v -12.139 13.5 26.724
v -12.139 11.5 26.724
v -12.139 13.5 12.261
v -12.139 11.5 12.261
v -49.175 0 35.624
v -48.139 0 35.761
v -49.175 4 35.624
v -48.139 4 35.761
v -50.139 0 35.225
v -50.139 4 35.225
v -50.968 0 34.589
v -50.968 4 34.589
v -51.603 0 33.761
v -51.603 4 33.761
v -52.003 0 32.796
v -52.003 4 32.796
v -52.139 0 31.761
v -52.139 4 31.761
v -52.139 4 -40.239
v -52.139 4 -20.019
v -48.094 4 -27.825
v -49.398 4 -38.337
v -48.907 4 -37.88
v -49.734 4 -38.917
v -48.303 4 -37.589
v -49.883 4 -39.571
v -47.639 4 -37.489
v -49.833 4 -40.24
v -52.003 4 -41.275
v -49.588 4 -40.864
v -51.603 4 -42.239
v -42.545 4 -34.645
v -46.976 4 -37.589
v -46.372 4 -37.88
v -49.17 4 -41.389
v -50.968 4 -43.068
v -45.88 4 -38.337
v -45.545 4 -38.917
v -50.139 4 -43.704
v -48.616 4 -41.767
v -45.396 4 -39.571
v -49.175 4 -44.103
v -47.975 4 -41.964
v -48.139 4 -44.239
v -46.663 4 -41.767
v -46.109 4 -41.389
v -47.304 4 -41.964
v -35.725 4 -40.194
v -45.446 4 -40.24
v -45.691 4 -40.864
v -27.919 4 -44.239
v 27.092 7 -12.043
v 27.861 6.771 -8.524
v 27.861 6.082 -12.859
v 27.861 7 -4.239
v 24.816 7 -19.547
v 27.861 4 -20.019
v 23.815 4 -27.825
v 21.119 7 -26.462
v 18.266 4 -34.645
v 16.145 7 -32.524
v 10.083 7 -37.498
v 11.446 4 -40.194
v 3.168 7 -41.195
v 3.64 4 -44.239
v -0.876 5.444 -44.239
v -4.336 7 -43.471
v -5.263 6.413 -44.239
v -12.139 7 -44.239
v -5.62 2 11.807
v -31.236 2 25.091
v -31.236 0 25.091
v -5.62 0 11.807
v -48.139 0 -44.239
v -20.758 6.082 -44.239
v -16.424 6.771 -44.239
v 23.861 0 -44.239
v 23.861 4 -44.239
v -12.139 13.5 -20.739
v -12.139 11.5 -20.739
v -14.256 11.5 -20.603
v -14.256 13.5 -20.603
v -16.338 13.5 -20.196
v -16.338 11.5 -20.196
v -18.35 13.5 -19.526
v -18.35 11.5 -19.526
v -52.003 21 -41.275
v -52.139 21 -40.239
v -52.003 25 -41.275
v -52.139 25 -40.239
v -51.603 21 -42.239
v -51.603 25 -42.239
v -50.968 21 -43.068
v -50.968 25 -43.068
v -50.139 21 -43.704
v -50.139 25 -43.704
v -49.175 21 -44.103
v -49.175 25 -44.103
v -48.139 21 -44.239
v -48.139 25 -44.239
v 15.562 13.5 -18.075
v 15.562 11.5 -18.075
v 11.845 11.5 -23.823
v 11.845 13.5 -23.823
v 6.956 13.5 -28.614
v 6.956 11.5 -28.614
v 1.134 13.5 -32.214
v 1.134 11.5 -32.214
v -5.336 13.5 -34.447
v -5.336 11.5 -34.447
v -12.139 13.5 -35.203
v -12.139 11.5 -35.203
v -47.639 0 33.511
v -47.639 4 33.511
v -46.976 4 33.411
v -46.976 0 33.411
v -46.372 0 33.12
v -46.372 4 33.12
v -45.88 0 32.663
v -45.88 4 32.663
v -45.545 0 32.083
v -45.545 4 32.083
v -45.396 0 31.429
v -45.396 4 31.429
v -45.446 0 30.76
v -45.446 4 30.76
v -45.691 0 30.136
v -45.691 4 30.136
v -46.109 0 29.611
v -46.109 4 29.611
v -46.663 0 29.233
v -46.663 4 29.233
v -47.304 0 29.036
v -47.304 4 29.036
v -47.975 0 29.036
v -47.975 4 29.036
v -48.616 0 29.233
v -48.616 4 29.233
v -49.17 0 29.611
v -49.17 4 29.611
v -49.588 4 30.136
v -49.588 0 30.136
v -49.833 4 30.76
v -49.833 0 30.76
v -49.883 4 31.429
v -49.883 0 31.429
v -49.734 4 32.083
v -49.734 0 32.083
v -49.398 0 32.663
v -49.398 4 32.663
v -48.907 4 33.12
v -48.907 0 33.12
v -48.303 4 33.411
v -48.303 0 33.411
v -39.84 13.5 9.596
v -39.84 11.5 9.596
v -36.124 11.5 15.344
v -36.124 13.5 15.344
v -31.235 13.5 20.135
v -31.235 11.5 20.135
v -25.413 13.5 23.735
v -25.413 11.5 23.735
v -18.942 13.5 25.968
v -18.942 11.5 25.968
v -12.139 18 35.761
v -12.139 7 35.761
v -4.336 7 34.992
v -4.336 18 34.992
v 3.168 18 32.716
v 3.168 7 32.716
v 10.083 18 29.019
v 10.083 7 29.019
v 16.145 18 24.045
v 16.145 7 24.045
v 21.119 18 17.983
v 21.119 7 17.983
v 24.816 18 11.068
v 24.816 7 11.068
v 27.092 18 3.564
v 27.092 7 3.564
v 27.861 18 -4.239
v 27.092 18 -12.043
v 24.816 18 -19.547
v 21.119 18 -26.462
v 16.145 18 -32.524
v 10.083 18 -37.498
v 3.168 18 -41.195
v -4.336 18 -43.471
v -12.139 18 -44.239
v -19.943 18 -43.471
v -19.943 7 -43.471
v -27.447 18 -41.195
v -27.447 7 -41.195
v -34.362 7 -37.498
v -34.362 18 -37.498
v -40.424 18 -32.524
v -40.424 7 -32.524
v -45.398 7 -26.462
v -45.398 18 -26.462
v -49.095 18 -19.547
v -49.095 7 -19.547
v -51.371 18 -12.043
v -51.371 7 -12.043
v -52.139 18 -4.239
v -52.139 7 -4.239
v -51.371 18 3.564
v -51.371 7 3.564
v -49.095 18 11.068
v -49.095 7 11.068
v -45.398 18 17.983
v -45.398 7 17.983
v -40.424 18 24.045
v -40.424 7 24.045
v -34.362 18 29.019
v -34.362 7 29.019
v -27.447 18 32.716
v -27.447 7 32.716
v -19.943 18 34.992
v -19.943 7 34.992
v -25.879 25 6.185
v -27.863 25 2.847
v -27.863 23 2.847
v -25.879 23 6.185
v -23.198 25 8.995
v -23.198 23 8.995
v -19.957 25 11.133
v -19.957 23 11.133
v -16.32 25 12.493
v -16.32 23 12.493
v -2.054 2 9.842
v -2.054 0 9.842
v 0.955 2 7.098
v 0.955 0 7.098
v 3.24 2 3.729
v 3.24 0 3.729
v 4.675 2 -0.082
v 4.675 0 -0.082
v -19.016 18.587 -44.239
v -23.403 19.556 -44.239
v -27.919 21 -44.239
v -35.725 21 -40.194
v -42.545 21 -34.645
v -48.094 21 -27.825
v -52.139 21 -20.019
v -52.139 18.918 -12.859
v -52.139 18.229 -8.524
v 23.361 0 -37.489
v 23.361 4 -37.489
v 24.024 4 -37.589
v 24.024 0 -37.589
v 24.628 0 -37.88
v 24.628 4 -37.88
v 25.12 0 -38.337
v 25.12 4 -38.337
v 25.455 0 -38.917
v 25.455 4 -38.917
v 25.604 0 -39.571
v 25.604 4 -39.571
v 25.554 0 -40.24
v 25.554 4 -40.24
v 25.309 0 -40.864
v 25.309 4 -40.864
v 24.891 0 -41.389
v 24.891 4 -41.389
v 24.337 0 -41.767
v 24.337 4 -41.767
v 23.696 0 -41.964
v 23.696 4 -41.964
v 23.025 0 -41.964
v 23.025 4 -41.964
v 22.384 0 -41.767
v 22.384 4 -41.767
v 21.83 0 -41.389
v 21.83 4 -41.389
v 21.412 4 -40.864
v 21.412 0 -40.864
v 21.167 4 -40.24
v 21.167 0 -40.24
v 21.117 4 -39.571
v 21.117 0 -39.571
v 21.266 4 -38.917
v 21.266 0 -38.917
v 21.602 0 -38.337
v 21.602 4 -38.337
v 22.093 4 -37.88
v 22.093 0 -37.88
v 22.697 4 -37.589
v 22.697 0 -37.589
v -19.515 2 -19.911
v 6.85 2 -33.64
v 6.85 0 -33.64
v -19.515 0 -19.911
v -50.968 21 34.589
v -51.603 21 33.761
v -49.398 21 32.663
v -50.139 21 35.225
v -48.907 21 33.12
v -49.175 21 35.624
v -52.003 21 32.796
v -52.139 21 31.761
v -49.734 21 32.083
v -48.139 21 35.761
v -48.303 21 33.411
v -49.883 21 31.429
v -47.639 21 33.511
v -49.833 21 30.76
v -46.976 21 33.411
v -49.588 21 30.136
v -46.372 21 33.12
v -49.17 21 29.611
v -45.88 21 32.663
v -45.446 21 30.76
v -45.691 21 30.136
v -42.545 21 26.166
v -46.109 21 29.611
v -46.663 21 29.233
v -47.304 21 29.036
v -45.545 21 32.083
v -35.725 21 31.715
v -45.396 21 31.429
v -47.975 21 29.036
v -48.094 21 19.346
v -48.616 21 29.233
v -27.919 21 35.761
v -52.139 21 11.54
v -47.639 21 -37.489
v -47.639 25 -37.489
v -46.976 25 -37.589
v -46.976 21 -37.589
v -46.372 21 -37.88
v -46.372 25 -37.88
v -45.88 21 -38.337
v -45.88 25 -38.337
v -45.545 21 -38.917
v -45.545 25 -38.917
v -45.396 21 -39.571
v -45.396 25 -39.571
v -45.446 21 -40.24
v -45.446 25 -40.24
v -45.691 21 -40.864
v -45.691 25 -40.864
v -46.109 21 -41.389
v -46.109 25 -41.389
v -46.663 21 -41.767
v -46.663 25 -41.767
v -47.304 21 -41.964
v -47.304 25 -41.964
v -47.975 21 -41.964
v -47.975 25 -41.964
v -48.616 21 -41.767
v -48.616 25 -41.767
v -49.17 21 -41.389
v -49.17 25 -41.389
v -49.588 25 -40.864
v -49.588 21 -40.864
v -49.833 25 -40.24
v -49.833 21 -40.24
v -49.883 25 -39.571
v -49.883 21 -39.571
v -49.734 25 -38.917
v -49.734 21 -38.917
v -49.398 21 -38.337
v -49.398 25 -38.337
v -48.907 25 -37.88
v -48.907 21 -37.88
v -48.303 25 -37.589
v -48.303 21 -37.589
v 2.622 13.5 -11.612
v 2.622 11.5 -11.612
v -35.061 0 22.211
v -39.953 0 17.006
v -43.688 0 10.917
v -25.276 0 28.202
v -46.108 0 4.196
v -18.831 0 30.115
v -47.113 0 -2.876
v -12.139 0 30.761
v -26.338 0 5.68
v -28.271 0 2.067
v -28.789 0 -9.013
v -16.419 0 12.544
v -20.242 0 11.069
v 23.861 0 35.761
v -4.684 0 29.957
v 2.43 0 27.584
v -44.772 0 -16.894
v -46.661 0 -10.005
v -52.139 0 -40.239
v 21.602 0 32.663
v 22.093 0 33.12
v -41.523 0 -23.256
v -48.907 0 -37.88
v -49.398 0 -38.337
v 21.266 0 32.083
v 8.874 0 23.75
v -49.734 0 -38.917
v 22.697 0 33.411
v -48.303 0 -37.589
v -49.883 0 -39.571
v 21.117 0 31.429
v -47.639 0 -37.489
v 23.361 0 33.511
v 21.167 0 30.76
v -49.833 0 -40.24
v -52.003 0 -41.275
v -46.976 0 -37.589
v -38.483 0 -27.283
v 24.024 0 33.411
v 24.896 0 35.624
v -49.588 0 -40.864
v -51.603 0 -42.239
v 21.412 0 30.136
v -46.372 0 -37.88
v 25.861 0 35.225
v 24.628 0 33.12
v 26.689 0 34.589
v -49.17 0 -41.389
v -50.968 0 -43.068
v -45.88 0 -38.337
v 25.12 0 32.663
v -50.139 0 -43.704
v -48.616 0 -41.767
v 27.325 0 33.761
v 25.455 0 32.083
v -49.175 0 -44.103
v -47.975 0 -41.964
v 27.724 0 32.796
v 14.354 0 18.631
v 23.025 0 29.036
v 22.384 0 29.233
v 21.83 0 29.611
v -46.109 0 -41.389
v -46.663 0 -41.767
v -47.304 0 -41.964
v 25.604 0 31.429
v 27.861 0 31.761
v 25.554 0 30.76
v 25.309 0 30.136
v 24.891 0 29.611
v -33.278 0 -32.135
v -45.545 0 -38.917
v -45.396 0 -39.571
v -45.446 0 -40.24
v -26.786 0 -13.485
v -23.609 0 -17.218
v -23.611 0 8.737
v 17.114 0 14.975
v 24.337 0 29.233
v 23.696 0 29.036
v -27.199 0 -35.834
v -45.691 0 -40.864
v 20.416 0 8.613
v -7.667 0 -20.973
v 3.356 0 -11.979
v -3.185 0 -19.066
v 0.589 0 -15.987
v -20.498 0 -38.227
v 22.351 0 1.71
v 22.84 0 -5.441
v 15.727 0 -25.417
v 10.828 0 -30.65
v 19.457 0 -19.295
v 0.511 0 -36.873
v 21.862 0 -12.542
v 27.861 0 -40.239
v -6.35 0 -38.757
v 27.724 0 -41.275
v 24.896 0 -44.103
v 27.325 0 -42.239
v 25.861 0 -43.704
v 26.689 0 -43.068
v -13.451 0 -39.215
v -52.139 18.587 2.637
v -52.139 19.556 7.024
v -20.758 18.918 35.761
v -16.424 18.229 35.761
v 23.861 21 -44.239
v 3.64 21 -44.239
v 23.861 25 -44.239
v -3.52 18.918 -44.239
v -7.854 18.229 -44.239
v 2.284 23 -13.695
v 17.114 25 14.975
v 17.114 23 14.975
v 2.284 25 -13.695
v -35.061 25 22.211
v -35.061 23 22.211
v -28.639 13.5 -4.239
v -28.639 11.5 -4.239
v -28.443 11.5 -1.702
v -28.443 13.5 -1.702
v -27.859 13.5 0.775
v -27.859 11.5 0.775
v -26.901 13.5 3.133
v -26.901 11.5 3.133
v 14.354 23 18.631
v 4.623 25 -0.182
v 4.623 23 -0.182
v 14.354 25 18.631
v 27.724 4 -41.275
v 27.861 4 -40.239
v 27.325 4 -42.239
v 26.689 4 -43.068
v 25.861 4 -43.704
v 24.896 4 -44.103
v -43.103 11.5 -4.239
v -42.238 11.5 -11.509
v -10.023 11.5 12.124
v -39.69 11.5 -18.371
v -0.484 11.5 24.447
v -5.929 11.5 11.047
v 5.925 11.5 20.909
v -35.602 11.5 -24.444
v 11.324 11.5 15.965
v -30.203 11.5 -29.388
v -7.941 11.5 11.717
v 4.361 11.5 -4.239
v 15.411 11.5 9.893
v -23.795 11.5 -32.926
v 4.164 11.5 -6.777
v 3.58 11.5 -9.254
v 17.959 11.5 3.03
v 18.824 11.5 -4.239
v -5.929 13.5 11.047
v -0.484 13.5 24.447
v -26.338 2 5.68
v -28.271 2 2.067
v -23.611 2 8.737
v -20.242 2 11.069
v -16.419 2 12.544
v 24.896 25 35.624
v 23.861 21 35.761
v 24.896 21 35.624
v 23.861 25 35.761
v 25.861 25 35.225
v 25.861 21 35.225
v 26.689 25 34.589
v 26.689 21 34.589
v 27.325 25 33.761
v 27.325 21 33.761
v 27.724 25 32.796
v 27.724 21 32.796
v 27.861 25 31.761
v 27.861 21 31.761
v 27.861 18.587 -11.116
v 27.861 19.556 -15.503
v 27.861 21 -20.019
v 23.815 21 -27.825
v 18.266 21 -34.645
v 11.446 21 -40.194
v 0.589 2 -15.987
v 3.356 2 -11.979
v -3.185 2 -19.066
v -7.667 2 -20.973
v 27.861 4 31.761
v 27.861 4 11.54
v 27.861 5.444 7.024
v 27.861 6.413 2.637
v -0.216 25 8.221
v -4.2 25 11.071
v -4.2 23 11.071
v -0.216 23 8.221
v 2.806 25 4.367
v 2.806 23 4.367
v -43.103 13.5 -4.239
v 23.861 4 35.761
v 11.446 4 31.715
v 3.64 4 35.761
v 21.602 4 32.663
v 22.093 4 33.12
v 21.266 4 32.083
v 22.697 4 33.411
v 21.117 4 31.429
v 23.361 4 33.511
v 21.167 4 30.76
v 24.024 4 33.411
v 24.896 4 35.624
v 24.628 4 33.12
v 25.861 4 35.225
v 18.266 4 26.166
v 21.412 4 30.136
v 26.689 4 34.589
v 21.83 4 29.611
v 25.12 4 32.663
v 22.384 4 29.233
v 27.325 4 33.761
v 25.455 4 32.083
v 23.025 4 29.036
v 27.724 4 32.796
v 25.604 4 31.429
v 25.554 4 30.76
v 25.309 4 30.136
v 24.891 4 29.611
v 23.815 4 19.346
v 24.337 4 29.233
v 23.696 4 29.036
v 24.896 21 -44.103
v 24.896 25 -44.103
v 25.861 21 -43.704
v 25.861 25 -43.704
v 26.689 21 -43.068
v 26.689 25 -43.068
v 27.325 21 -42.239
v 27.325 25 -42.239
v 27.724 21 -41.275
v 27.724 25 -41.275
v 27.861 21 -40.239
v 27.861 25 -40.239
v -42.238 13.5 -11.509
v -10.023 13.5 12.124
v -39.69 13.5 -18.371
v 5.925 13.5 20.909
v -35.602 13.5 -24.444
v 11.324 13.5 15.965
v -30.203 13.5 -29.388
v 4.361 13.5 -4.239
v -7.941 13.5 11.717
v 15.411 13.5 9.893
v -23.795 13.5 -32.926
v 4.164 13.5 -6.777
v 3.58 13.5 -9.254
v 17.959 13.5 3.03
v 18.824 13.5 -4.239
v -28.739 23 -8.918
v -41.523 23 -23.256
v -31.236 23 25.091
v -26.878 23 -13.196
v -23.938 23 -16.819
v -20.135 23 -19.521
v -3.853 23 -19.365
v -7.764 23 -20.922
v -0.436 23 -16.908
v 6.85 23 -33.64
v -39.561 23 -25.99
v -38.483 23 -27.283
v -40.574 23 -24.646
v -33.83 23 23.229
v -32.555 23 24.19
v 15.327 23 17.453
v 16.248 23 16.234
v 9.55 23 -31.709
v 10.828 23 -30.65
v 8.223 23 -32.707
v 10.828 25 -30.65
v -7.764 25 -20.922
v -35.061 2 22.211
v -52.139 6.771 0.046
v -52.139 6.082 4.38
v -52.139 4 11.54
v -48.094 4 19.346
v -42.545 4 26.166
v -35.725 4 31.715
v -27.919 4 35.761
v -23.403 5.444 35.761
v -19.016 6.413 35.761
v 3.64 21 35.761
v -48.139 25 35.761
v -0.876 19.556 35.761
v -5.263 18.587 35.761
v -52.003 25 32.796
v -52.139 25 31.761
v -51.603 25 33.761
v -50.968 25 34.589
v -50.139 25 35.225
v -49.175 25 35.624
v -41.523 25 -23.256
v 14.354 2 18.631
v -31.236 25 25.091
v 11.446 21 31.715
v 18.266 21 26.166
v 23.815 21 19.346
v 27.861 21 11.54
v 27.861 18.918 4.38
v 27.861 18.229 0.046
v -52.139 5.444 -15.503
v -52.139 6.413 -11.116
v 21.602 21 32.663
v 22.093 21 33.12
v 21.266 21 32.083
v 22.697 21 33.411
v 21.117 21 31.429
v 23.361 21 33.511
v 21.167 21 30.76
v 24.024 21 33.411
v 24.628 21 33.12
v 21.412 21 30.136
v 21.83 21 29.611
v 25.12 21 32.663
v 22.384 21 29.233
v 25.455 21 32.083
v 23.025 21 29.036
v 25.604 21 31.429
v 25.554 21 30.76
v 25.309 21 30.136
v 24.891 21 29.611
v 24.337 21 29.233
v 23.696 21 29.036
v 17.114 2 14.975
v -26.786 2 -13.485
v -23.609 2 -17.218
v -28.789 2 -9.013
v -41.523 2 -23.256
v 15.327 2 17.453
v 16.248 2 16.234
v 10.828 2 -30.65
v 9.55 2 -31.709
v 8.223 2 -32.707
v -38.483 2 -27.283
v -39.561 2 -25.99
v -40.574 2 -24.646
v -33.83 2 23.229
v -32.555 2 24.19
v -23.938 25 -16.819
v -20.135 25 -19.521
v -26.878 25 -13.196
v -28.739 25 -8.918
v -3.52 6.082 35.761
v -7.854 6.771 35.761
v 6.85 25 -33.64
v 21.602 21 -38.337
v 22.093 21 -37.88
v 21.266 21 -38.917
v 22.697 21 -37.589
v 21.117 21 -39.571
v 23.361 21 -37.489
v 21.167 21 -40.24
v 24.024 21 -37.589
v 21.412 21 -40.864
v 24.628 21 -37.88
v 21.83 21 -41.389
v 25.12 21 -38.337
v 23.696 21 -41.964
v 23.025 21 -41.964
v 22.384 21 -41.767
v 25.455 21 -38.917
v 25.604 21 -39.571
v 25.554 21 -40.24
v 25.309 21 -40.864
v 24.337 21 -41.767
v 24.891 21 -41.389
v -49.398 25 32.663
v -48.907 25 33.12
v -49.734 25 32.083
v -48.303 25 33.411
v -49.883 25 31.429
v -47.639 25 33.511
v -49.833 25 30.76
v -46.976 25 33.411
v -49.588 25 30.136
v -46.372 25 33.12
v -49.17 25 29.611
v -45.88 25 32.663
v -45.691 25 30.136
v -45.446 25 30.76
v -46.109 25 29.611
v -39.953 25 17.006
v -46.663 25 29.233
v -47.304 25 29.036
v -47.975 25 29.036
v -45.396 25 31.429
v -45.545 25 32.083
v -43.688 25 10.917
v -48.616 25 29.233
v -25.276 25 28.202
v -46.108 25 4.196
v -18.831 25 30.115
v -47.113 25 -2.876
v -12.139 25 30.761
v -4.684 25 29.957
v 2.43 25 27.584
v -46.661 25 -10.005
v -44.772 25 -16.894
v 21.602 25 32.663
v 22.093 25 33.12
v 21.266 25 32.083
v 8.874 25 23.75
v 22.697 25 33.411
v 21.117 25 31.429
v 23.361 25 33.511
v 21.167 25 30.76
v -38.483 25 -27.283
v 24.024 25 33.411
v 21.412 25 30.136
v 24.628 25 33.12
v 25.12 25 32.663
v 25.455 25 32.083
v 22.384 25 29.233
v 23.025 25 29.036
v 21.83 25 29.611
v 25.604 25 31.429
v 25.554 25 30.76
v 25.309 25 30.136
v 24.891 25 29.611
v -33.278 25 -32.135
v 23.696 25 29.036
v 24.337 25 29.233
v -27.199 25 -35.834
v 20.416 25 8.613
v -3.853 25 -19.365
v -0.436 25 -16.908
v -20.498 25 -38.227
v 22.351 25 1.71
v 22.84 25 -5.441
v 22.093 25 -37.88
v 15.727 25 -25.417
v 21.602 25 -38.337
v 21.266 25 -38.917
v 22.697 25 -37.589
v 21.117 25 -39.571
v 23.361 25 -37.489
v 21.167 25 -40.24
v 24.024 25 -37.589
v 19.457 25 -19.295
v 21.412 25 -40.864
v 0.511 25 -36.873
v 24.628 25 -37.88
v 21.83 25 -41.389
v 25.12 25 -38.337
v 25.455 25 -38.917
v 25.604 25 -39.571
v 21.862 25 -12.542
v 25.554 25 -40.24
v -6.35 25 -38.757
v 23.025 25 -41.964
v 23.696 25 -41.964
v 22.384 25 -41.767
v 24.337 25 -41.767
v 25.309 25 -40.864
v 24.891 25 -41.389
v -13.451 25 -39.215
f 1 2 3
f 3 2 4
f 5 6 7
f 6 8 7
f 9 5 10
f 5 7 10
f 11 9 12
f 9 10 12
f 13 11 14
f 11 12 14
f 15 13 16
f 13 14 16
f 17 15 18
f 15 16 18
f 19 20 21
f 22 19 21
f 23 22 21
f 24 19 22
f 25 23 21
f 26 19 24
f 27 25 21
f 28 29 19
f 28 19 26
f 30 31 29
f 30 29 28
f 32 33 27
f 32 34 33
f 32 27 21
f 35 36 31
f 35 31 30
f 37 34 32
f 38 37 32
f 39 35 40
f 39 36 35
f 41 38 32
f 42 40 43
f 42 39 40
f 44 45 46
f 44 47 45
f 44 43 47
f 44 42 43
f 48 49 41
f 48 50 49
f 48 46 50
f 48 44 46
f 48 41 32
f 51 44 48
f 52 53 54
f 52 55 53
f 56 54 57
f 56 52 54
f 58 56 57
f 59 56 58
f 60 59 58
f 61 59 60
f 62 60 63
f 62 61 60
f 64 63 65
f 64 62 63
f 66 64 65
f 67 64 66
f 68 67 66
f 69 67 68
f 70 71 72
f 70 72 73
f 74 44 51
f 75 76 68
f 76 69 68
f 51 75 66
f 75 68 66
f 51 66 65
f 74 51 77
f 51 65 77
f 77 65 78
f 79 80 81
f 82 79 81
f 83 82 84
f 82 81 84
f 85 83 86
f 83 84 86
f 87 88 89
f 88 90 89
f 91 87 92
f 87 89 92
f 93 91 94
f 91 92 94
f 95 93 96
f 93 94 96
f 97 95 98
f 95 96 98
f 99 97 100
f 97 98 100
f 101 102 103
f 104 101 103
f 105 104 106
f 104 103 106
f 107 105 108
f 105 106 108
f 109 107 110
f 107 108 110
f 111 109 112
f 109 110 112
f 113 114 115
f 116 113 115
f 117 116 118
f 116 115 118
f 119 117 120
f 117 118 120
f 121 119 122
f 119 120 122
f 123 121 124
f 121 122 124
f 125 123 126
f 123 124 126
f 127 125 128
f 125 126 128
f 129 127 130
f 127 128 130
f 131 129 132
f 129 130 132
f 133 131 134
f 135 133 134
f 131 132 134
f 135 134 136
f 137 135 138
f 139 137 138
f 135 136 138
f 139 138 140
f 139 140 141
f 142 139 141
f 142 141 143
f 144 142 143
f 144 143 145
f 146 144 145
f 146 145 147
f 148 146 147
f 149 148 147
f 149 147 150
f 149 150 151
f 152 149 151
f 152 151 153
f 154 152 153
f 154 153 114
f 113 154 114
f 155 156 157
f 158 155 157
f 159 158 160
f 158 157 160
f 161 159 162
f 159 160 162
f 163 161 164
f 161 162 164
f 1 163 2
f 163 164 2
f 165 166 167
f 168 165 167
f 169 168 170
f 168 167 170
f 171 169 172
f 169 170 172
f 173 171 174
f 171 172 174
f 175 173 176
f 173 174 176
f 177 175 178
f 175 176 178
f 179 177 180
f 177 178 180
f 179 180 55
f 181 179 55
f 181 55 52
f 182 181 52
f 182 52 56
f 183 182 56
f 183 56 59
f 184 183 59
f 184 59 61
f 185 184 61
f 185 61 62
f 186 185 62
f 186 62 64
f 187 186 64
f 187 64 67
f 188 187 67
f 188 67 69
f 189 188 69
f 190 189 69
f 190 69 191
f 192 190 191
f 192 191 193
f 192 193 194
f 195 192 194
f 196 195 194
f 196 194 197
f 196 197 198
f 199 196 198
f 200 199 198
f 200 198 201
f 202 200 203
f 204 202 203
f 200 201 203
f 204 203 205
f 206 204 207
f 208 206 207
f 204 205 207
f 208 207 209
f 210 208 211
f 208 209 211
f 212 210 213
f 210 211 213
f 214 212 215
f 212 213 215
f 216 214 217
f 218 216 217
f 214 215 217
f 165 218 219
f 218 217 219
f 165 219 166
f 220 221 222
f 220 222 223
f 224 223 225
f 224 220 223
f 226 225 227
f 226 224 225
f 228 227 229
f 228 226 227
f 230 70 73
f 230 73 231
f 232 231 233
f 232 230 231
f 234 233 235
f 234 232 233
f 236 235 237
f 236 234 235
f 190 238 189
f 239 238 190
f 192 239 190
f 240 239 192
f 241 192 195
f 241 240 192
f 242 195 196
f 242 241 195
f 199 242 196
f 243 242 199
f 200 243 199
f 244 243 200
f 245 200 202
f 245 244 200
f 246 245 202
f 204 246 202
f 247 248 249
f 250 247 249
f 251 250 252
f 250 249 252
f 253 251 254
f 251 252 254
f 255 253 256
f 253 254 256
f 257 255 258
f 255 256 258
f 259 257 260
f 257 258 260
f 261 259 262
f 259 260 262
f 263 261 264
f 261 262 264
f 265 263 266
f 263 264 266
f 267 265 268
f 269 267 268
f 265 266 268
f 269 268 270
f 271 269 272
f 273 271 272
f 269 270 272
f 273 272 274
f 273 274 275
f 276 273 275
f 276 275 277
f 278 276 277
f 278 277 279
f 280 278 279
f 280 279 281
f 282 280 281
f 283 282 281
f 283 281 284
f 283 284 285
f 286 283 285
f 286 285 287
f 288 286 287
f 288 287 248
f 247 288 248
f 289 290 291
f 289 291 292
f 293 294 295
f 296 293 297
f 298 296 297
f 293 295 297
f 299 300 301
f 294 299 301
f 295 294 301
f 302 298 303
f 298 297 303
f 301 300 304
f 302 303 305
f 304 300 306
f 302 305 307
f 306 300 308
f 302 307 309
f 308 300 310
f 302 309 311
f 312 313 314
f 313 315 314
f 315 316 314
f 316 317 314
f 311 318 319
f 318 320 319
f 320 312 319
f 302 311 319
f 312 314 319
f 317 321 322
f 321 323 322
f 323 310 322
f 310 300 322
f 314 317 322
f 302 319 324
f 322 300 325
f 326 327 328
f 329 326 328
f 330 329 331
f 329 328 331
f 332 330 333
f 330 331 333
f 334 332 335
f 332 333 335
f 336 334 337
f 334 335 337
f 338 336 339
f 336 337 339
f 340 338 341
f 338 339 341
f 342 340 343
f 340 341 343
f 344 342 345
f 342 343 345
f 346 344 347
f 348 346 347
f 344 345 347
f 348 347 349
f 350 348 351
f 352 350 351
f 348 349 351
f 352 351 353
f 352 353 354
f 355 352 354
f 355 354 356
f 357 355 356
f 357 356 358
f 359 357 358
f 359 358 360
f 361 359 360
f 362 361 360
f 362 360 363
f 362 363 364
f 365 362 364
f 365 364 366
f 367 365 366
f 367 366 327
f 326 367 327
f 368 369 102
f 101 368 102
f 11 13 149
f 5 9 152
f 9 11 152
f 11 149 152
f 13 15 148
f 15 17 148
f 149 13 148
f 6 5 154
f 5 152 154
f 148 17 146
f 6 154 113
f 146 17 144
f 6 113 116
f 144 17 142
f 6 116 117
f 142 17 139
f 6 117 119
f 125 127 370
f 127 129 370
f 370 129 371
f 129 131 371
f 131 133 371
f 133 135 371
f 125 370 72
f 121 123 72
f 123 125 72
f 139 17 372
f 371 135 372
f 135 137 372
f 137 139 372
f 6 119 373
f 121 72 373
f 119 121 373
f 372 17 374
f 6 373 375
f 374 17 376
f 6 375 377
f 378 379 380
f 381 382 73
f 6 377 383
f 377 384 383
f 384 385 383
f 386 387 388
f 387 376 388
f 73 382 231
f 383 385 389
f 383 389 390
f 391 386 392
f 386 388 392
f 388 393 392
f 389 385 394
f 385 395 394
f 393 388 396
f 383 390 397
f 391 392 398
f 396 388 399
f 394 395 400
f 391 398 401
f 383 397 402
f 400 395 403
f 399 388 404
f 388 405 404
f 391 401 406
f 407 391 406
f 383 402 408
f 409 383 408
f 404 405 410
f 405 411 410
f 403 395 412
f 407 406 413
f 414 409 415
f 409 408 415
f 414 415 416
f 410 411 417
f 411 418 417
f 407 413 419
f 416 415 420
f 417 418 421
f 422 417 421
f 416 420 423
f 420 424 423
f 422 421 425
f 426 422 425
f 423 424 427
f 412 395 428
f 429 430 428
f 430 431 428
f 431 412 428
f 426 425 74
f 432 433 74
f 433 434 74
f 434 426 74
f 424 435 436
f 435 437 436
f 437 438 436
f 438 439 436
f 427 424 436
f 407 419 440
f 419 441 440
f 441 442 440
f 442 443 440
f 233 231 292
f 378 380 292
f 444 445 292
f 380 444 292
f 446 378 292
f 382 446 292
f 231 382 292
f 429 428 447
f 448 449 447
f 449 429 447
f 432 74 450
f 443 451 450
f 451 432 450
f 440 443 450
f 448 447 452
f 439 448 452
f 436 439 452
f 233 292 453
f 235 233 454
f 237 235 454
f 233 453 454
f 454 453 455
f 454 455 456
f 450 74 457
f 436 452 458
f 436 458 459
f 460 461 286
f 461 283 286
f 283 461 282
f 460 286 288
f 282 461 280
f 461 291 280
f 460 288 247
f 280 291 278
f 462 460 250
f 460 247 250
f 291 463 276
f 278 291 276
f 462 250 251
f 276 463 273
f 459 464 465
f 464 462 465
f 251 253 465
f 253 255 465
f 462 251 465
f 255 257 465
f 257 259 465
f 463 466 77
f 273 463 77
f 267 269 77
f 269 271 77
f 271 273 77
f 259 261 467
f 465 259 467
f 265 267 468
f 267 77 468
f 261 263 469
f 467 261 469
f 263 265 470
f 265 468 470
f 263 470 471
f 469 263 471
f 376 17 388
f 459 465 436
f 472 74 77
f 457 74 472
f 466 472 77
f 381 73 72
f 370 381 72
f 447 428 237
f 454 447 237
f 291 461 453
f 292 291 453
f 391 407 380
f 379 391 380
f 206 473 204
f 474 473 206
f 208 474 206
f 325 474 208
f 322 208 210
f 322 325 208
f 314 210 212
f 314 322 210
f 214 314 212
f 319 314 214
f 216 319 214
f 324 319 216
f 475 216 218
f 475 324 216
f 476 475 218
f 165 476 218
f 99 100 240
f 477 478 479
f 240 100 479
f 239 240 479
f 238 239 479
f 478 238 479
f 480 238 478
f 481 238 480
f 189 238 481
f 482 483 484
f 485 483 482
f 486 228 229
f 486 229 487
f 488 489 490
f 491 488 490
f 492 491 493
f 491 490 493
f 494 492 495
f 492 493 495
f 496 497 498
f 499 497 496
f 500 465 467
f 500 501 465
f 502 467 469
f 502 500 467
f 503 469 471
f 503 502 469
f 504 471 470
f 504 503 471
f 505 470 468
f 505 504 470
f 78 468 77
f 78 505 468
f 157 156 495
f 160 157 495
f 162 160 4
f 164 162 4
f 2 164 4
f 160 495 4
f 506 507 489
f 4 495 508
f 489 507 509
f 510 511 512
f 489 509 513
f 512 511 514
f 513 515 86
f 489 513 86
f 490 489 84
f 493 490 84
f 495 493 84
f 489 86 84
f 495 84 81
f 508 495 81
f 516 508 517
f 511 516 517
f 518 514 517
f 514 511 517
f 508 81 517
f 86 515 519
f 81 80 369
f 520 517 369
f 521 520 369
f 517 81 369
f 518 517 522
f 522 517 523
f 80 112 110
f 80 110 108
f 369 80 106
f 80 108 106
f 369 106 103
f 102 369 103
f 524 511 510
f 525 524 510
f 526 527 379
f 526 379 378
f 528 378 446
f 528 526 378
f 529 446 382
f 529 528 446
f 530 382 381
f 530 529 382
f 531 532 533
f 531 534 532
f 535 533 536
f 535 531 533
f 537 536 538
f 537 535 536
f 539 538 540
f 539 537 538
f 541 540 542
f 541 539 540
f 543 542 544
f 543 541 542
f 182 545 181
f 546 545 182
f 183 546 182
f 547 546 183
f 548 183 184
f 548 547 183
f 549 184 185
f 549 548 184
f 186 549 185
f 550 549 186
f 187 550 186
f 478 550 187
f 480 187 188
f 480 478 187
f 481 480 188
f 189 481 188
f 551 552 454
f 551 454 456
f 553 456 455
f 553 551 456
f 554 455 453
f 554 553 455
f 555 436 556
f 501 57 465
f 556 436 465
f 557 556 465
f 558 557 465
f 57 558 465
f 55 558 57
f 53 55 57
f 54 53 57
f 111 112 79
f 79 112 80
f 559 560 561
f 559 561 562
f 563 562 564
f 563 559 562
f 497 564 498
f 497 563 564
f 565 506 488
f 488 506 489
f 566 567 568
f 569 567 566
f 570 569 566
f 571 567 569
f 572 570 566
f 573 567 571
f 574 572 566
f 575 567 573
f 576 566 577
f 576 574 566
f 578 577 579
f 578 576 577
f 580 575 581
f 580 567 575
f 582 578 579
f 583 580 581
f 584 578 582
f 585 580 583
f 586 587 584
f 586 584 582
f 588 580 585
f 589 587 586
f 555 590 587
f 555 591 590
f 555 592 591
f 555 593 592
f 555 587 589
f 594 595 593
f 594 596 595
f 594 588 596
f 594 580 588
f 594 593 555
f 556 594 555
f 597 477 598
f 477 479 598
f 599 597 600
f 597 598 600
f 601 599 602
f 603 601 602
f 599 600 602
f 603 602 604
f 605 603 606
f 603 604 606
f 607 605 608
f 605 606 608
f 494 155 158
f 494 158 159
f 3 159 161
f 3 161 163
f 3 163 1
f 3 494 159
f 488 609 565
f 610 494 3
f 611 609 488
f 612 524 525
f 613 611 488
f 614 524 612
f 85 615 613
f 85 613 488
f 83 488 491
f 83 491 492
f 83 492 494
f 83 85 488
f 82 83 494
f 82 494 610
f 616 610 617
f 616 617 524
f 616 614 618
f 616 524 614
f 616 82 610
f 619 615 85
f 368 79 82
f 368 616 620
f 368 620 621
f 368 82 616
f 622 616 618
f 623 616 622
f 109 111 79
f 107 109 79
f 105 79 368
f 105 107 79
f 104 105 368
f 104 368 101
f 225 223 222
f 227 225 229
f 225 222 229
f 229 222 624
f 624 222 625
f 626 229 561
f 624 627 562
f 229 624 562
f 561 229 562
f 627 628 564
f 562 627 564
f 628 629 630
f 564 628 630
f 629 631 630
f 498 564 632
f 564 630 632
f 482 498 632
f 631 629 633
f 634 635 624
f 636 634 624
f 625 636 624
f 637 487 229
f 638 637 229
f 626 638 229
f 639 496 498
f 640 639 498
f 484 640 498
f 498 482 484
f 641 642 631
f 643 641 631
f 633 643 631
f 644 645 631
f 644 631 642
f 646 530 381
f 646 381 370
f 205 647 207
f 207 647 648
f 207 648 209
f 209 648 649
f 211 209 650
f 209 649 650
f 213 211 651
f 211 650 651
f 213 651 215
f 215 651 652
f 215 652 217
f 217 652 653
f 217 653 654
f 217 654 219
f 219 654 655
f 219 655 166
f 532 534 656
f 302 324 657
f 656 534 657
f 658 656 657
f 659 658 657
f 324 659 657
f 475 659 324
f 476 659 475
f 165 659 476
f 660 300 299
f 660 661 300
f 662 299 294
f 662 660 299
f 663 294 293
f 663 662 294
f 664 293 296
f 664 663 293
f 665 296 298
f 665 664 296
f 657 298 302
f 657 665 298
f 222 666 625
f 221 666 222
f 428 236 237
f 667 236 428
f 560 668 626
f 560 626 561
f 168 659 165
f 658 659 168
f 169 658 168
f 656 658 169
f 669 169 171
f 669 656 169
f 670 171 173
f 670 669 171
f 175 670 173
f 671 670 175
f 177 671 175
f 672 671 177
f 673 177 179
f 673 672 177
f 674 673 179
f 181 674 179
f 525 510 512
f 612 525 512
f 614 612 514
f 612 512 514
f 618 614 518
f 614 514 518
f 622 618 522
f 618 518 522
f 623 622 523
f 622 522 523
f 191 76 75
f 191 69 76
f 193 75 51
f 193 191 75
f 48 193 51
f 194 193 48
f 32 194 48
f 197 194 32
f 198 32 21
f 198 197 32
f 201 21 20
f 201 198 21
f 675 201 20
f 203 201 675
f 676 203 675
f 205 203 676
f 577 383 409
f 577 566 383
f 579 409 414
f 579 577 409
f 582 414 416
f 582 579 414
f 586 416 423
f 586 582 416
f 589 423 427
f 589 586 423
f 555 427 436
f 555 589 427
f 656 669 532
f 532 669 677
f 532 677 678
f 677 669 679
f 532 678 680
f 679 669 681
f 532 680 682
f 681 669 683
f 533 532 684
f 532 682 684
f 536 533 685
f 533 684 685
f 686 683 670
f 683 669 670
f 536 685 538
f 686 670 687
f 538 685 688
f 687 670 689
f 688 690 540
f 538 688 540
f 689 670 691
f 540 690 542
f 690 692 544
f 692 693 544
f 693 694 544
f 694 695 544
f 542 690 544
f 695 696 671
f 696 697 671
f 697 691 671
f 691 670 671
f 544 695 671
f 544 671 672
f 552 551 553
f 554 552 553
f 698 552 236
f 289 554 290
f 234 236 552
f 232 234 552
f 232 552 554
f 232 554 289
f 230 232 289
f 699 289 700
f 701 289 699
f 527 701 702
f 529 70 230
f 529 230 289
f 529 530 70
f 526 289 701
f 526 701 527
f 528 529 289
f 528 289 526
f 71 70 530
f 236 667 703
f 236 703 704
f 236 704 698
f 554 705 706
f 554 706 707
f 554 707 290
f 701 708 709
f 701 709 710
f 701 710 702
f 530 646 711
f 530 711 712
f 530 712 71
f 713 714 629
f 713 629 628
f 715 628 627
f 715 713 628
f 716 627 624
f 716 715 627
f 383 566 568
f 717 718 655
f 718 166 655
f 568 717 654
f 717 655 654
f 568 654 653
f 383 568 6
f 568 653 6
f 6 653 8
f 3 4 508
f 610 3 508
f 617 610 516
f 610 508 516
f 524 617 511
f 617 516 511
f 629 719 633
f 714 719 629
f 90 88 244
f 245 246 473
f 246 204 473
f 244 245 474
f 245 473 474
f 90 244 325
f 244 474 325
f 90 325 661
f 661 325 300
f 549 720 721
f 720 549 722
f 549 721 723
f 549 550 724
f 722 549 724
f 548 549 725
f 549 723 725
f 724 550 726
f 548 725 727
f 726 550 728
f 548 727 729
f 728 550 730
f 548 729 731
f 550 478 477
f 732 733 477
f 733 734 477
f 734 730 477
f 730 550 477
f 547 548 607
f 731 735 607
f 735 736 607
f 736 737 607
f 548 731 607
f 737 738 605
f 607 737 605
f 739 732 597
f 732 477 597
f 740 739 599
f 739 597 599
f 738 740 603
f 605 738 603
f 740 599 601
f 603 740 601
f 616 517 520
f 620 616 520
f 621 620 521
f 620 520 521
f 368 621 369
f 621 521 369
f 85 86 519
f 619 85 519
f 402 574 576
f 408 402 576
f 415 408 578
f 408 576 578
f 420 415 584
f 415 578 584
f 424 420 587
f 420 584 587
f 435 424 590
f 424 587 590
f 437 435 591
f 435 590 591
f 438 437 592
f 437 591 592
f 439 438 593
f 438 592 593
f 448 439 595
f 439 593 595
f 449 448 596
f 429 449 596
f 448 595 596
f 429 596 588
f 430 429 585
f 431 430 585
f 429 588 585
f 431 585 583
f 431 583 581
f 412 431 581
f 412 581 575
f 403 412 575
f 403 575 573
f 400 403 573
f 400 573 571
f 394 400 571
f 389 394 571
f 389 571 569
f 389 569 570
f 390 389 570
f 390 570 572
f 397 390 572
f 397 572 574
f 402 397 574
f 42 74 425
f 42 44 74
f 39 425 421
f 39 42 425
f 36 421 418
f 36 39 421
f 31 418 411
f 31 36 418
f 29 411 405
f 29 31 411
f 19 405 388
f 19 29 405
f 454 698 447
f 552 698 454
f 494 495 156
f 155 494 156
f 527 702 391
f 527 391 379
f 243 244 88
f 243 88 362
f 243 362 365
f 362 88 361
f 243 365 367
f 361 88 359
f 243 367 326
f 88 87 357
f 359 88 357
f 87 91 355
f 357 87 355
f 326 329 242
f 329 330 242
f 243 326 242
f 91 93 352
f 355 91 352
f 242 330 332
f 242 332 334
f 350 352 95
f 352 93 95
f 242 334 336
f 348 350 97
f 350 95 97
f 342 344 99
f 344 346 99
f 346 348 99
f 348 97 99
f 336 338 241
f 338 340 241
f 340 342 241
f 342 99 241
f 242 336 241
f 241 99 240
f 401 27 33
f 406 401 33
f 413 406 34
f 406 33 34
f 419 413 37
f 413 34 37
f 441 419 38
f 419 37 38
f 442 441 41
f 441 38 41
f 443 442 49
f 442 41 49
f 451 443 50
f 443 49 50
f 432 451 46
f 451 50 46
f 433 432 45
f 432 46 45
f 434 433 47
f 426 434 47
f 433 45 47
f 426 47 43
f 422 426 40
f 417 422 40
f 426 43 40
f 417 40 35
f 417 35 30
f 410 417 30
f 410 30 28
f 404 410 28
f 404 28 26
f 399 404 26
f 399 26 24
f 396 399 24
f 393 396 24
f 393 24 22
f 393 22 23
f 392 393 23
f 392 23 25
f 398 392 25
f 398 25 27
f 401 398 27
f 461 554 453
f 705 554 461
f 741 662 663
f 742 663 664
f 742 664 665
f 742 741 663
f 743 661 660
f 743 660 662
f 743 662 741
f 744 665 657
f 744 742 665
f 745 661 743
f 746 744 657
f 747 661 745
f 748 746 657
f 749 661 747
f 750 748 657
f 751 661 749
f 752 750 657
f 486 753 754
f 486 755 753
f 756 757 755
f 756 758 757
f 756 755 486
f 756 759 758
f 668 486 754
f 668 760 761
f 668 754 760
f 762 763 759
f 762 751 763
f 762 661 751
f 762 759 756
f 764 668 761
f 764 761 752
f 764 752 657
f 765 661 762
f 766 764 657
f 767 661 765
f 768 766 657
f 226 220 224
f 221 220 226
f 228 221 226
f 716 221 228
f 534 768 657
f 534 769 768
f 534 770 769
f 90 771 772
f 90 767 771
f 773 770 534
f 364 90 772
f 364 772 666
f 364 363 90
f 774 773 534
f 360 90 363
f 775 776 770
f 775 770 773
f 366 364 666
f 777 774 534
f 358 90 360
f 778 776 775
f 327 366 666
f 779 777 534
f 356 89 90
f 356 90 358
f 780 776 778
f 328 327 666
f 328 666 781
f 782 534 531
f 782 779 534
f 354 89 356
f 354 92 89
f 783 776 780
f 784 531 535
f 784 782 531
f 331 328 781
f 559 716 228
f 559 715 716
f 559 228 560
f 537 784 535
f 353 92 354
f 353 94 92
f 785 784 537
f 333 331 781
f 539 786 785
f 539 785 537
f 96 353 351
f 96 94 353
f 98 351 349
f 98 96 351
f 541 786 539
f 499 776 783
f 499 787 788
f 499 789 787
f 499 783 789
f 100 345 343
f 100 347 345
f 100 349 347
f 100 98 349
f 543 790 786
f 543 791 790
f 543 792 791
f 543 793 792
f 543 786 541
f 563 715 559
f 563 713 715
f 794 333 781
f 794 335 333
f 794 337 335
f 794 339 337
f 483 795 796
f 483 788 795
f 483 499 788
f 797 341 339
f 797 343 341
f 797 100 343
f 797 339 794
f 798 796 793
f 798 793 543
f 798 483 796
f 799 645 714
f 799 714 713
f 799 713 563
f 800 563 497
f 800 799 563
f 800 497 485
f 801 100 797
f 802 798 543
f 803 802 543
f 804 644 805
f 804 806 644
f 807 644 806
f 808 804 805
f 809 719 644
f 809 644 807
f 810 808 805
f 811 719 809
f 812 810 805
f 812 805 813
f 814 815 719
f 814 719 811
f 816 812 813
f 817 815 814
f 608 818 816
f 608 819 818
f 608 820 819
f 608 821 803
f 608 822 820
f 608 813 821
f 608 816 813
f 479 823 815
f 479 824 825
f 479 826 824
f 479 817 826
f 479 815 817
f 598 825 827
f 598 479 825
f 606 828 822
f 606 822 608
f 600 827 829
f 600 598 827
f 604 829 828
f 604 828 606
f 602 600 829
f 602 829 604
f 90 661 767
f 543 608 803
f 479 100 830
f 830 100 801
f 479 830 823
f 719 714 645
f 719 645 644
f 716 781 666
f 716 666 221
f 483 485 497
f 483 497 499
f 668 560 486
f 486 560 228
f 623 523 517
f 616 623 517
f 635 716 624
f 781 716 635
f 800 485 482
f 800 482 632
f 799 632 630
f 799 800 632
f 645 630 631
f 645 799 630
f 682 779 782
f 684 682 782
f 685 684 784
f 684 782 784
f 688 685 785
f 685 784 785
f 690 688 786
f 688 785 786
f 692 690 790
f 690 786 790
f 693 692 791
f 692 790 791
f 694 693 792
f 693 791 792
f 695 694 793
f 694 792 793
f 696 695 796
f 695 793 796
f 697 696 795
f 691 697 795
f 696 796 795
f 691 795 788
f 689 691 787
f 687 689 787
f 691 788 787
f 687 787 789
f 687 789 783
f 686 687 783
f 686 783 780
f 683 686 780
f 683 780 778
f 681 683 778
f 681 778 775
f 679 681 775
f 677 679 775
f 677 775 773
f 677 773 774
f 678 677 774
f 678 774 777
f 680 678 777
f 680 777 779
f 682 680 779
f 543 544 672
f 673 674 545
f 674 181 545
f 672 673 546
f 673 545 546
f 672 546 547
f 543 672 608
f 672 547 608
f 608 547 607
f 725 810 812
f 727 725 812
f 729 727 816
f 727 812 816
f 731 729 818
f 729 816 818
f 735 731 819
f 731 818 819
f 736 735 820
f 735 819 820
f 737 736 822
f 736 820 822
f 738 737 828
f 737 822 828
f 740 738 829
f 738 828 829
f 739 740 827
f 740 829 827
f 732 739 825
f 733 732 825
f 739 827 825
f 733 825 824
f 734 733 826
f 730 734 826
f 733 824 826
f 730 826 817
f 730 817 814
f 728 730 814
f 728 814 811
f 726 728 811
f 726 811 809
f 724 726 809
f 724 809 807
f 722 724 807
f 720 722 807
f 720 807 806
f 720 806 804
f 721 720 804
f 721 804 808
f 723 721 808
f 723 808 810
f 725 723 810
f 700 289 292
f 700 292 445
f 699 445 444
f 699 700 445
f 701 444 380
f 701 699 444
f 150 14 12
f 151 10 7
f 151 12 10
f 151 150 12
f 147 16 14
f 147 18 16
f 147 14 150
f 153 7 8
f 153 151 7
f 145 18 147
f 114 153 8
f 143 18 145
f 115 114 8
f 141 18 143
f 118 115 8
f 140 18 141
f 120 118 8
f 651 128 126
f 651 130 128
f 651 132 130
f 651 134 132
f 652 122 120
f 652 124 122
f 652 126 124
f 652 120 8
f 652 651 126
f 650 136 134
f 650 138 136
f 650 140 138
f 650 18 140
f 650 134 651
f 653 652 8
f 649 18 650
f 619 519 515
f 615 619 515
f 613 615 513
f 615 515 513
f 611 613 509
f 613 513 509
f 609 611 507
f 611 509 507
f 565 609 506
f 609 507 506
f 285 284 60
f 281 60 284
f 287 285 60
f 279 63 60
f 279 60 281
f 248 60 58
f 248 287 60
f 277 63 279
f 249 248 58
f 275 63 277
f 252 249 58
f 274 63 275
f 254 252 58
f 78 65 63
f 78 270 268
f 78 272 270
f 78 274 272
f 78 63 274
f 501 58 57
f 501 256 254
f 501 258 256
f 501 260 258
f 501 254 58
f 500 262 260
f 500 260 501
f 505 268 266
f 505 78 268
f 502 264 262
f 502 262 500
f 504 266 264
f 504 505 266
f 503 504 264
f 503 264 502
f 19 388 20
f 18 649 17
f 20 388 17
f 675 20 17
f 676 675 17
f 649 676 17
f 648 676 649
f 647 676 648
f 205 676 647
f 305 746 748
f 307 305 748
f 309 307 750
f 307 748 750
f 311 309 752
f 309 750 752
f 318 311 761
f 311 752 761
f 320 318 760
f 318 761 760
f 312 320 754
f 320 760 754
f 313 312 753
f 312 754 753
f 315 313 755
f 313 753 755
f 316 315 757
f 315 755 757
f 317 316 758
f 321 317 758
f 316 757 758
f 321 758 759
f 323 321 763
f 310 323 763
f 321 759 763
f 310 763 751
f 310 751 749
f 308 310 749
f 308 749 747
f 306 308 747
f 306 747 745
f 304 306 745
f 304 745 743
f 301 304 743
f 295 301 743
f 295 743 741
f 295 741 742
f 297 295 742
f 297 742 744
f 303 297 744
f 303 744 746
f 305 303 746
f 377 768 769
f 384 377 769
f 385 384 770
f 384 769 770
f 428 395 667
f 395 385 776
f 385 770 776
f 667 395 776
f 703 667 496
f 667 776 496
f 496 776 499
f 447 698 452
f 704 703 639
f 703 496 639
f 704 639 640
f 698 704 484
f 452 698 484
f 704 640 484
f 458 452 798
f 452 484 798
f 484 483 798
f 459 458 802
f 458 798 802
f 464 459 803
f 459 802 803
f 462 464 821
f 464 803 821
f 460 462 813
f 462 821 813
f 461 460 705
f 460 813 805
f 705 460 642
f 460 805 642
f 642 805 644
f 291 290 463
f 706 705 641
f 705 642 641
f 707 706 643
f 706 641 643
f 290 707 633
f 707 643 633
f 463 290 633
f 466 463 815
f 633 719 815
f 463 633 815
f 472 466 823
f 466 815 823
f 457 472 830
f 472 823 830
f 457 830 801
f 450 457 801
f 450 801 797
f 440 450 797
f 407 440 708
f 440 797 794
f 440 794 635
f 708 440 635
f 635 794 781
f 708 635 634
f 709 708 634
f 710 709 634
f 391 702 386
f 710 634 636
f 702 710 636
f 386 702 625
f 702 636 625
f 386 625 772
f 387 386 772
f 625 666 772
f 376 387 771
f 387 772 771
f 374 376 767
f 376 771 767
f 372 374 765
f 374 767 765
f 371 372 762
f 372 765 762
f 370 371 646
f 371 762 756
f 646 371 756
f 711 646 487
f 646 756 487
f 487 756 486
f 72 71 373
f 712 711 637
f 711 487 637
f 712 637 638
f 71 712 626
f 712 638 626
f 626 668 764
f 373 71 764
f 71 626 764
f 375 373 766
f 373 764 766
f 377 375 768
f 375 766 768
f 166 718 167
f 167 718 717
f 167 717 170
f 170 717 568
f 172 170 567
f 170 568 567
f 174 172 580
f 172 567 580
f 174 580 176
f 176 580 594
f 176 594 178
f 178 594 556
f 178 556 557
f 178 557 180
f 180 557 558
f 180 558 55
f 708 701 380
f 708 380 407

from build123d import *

# Parameters (mm, degrees)
SKETCH_1_W           = 80
SKETCH_1_H           = 80
EXTRUDE_1_DEPTH      = 4
SKETCH_3_R           = 40
EXTRUDE_2_DEPTH      = 17
SKETCH_4_W           = 80
SKETCH_4_H           = 80
EXTRUDE_3_DEPTH      = 4
SKETCH_5_R           = 35
CUT_EXTRUDE_2_DEPTH  = 38
SKETCH_6_R           = 2.25
CUT_EXTRUDE_3_DEPTH  = 38
FILLET_1_R           = 4
CHAMFER_3_SIZE       = 3
EXTRUDE_4_DEPTH      = 1
EXTRUDE_4_DEPTH_BACK = 1
EXTRUDE_5_DEPTH      = 2
EXTRUDE_START        = -2
EXTRUDE_6_DEPTH      = 2


with BuildPart() as part:
    # Эскиз1 → Бобышка-Вытянуть1 (new body)
    with BuildSketch(Plane(origin=(0, 0, 0), x_dir=(1, 0, 0), z_dir=(0, 1, 0))):
        with Locations((-12.139359553, 4.23945659)):
            Rectangle(SKETCH_1_W, SKETCH_1_H)
    extrude(amount=EXTRUDE_1_DEPTH)

    # Эскиз3 → Бобышка-Вытянуть2 (add)
    with BuildSketch(Plane(origin=(0, 4, 0), x_dir=(1, 0, 0), z_dir=(0, 1, 0))):
        with Locations(Location((-12.139359553, 4.23945659, 0), (0, 0, 270))):
            Circle(SKETCH_3_R)
    extrude(amount=EXTRUDE_2_DEPTH)

    # Эскиз4 → Бобышка-Вытянуть3 (add)
    with BuildSketch(Plane(origin=(0, 21, 0), x_dir=(1, 0, 0), z_dir=(0, 1, 0))):
        with Locations((-12.139359553, 4.23945659)):
            Rectangle(SKETCH_4_W, SKETCH_4_H)
    extrude(amount=EXTRUDE_3_DEPTH)

    # Эскиз5 → Вырез-Вытянуть2 (cut)
    with BuildSketch(Plane(origin=(0, 25, 0), x_dir=(1, 0, 0), z_dir=(0, 1, 0))):
        with Locations(Location((-12.139359553, 4.23945659, 0), (0, 0, 270))):
            Circle(SKETCH_5_R)
    extrude(amount=-CUT_EXTRUDE_2_DEPTH, mode=Mode.SUBTRACT)

    # Эскиз6 → Вырез-Вытянуть3 (cut)
    with BuildSketch(Plane(origin=(0, 25, 0), x_dir=(1, 0, 0), z_dir=(0, 1, 0))):
        with Locations(Location((-47.639359553, 39.73945659, 0), (0, 0, 270))):
            Circle(SKETCH_6_R)
        with Locations(Location((23.360640447, 39.73945659, 0), (0, 0, 270))):
            Circle(SKETCH_6_R)
        with Locations(Location((-47.639359553, -31.26054341, 0), (0, 0, 270))):
            Circle(SKETCH_6_R)
        with Locations(Location((23.360640447, -31.26054341, 0), (0, 0, 270))):
            Circle(SKETCH_6_R)
    extrude(amount=-CUT_EXTRUDE_3_DEPTH, mode=Mode.SUBTRACT)

    # Скругление1
    fillet_1_edges = [part.edges().sort_by_distance(p)[0] for p in [
        (-52.139359553, 23, -44.23945659),
        (-52.139359553, 23, 35.76054341),
        (27.860640447, 23, 35.76054341),
        (27.860640447, 23, -44.23945659),
        (-52.139359553, 2, -44.23945659),
        (27.860640447, 2, -44.23945659),
        (27.860640447, 2, 35.76054341),
        (-52.139359553, 2, 35.76054341),
    ]]
    fillet(fillet_1_edges, radius=FILLET_1_R)

    # Фаска3
    # the kernel refuses this chamfer: 3 mm, written as the material it adds along each edge
    with BuildSketch(Plane(origin=(-12.139359553, 4, -4.23945659), x_dir=(-1, 0, 0), z_dir=(0, 0, -1))) as chamfer_3_piece_1_section:
        Polygon((40, CHAMFER_3_SIZE), (40 + CHAMFER_3_SIZE, 0), (40, 0), align=None)
    chamfer_3_piece_1 = revolve(axis=Axis((-12.139359553, 4, -4.23945659), (0, 1, 0)), revolution_arc=90, mode=Mode.PRIVATE)
    chamfer_3_piece_1 = split(chamfer_3_piece_1, bisect_by=Plane(origin=(-52.139359553, 5.457700283, 25.075564413), z_dir=(1, 0, 0)), keep=Keep.TOP, mode=Mode.PRIVATE)
    chamfer_3_piece_1 = split(chamfer_3_piece_1, bisect_by=Plane(origin=(-41.454380555, 5.457700283, 35.76054341), z_dir=(0, 0, -1)), keep=Keep.TOP, mode=Mode.PRIVATE)
    add(chamfer_3_piece_1)
    with BuildSketch(Plane(origin=(-12.139359553, 4, -4.23945659), x_dir=(0, 0, -1), z_dir=(1, 0, 0))) as chamfer_3_piece_2_section:
        Polygon((40 + CHAMFER_3_SIZE, 0), (40, CHAMFER_3_SIZE), (40, 0), align=None)
    chamfer_3_piece_2 = revolve(axis=Axis((-12.139359553, 4, -4.23945659), (0, 1, 0)), revolution_arc=90, mode=Mode.PRIVATE)
    chamfer_3_piece_2 = split(chamfer_3_piece_2, bisect_by=Plane(origin=(-41.454380555, 5.457700283, -44.23945659), z_dir=(0, 0, 1)), keep=Keep.TOP, mode=Mode.PRIVATE)
    chamfer_3_piece_2 = split(chamfer_3_piece_2, bisect_by=Plane(origin=(-52.139359553, 5.457700283, -33.554477593), z_dir=(1, 0, 0)), keep=Keep.TOP, mode=Mode.PRIVATE)
    add(chamfer_3_piece_2)
    with BuildSketch(Plane(origin=(-12.139359553, 4, -4.23945659), x_dir=(1.0, 0, 8.787882221916732e-09), z_dir=(-8.787882221916732e-09, 0, 1.0))) as chamfer_3_piece_3_section:
        Polygon((40 + CHAMFER_3_SIZE, 0), (40, CHAMFER_3_SIZE), (40, 0), align=None)
    chamfer_3_piece_3 = revolve(axis=Axis((-12.139359553, 4, -4.23945659), (0, 1, 0)), revolution_arc=90.000000504, mode=Mode.PRIVATE)
    chamfer_3_piece_3 = split(chamfer_3_piece_3, bisect_by=Plane(origin=(17.175661571, 5.457700294, -44.23945659), z_dir=(0, 0, 1)), keep=Keep.TOP, mode=Mode.PRIVATE)
    chamfer_3_piece_3 = split(chamfer_3_piece_3, bisect_by=Plane(origin=(27.860640447, 5.457700294, -33.554477456), z_dir=(-1, 0, 0)), keep=Keep.TOP, mode=Mode.PRIVATE)
    add(chamfer_3_piece_3)
    with BuildSketch(Plane(origin=(-12.139359553, 4, -4.23945659), x_dir=(0, 0, 1), z_dir=(-1, 0, 0))) as chamfer_3_piece_4_section:
        Polygon((40, CHAMFER_3_SIZE), (40 + CHAMFER_3_SIZE, 0), (40, 0), align=None)
    chamfer_3_piece_4 = revolve(axis=Axis((-12.139359553, 4, -4.23945659), (0, 1, 0)), revolution_arc=89.999999496, mode=Mode.PRIVATE)
    chamfer_3_piece_4 = split(chamfer_3_piece_4, bisect_by=Plane(origin=(27.860640447, 5.457700283, 25.075564541), z_dir=(-1, 0, 0)), keep=Keep.TOP, mode=Mode.PRIVATE)
    chamfer_3_piece_4 = split(chamfer_3_piece_4, bisect_by=Plane(origin=(17.175661321, 5.457700283, 35.76054341), z_dir=(0, 0, -1)), keep=Keep.TOP, mode=Mode.PRIVATE)
    add(chamfer_3_piece_4)
    with BuildSketch(Plane(origin=(-12.139359553, 21, -4.23945659), x_dir=(0, 0, 1), z_dir=(-1, 0, 0))) as chamfer_3_piece_5_section:
        Polygon((40, -CHAMFER_3_SIZE), (40 + CHAMFER_3_SIZE, 0), (40, 0), align=None)
    chamfer_3_piece_5 = revolve(axis=Axis((-12.139359553, 21, -4.23945659), (0, 1, 0)), revolution_arc=90.000000093, mode=Mode.PRIVATE)
    chamfer_3_piece_5 = split(chamfer_3_piece_5, bisect_by=Plane(origin=(27.860640447, 19.542299715, 25.075564387), z_dir=(-1, 0, 0)), keep=Keep.TOP, mode=Mode.PRIVATE)
    chamfer_3_piece_5 = split(chamfer_3_piece_5, bisect_by=Plane(origin=(17.175661472, 19.542299715, 35.76054341), z_dir=(0, 0, -1)), keep=Keep.TOP, mode=Mode.PRIVATE)
    add(chamfer_3_piece_5)
    with BuildSketch(Plane(origin=(-12.139359553, 21, -4.23945659), x_dir=(1.0, 0, -1.6192726937092062e-09), z_dir=(1.6192726937092062e-09, 0, 1.0))) as chamfer_3_piece_6_section:
        Polygon((40, -CHAMFER_3_SIZE), (40 + CHAMFER_3_SIZE, 0), (40, 0), align=None)
    chamfer_3_piece_6 = revolve(axis=Axis((-12.139359553, 21, -4.23945659), (0, 1, 0)), revolution_arc=89.999999907, mode=Mode.PRIVATE)
    chamfer_3_piece_6 = split(chamfer_3_piece_6, bisect_by=Plane(origin=(17.175661426, 19.542299717, -44.23945659), z_dir=(0, 0, 1)), keep=Keep.TOP, mode=Mode.PRIVATE)
    chamfer_3_piece_6 = split(chamfer_3_piece_6, bisect_by=Plane(origin=(27.860640447, 19.542299717, -33.554477616), z_dir=(-1, 0, 0)), keep=Keep.TOP, mode=Mode.PRIVATE)
    add(chamfer_3_piece_6)
    with BuildSketch(Plane(origin=(-12.139359553, 21, -4.23945659), x_dir=(0, 0, -1), z_dir=(1, 0, 0))) as chamfer_3_piece_7_section:
        Polygon((40, -CHAMFER_3_SIZE), (40 + CHAMFER_3_SIZE, 0), (40, 0), align=None)
    chamfer_3_piece_7 = revolve(axis=Axis((-12.139359553, 21, -4.23945659), (0, 1, 0)), revolution_arc=90, mode=Mode.PRIVATE)
    chamfer_3_piece_7 = split(chamfer_3_piece_7, bisect_by=Plane(origin=(-41.454380555, 19.542299717, -44.23945659), z_dir=(0, 0, 1)), keep=Keep.TOP, mode=Mode.PRIVATE)
    chamfer_3_piece_7 = split(chamfer_3_piece_7, bisect_by=Plane(origin=(-52.139359553, 19.542299717, -33.554477593), z_dir=(1, 0, 0)), keep=Keep.TOP, mode=Mode.PRIVATE)
    add(chamfer_3_piece_7)
    with BuildSketch(Plane(origin=(-12.139359553, 21, -4.23945659), x_dir=(-1, 0, 0), z_dir=(0, 0, -1))) as chamfer_3_piece_8_section:
        Polygon((40, -CHAMFER_3_SIZE), (40 + CHAMFER_3_SIZE, 0), (40, 0), align=None)
    chamfer_3_piece_8 = revolve(axis=Axis((-12.139359553, 21, -4.23945659), (0, 1, 0)), revolution_arc=90, mode=Mode.PRIVATE)
    chamfer_3_piece_8 = split(chamfer_3_piece_8, bisect_by=Plane(origin=(-52.139359553, 19.542299717, 25.075564413), z_dir=(1, 0, 0)), keep=Keep.TOP, mode=Mode.PRIVATE)
    chamfer_3_piece_8 = split(chamfer_3_piece_8, bisect_by=Plane(origin=(-41.454380555, 19.542299717, 35.76054341), z_dir=(0, 0, -1)), keep=Keep.TOP, mode=Mode.PRIVATE)
    add(chamfer_3_piece_8)

    # Эскиз8 → Бобышка-Вытянуть5 (add)
    with BuildSketch(Plane(origin=(0, 25, 0), x_dir=(1, 0, 0), z_dir=(0, 1, 0))):
        with BuildLine():
            Line((8.198715257, 34.345651042), (-20.134931912, 19.520610741))
            ThreePointArc((-20.134931912, 19.520610741), (-25.530989427, 15.107165587), (-28.739134966, 8.918164292))
            Line((-28.739134966, 8.918164292), (-39.14955843, 28.539032471))
            ThreePointArc((-39.14955843, 28.539032471), (-40.756497042, 26.624265575), (-42.22797062, 24.603535637))
            Line((-42.22797062, 24.603535637), (-27.862533393, -2.84747885))
            ThreePointArc((-27.862533393, -2.84747885), (-23.198349305, -8.994650679), (-16.32036828, -12.4926089))
            Line((-16.32036828, -12.4926089), (-36.329458207, -22.868832889))
            ThreePointArc((-36.329458207, -22.868832889), (-34.506306833, -24.391643646), (-32.587541045, -25.792061936))
            Line((-32.587541045, -25.792061936), (-4.199797418, -11.070873343))
            ThreePointArc((-4.199797418, -11.070873343), (1.432709083, -6.402056577), (4.623006763, 0.181633892))
            Line((4.623006763, 0.181633892), (15.011922437, -19.902376764))
            ThreePointArc((15.011922437, -19.902376764), (16.468234928, -18.157546991), (17.812605081, -16.325077102))
            Line((17.812605081, -16.325077102), (2.283855016, 13.69534))
            ThreePointArc((2.283855016, 13.69534), (-2.069571834, 18.240964539), (-7.76414681, 20.921793447))
            Line((-7.76414681, 20.921793447), (12.091807498, 31.311042705))
            ThreePointArc((12.091807498, 31.311042705), (10.196856374, 32.894537979), (8.198715257, 34.345651042))
        make_face()
    extrude(amount=-EXTRUDE_5_DEPTH)

    # Эскиз9 → Бобышка-Вытянуть6 (add)
    with BuildSketch(Plane.XZ.offset(EXTRUDE_START)):
        with BuildLine():
            Line((-31.236462552, 25.091425719), (-5.619662436, 11.807180567))
            ThreePointArc((-5.619662436, 11.807180567), (0.954624714, 7.098470494), (4.674729653, -0.081642411))
            Line((4.674729653, -0.081642411), (14.354483046, 18.631404879))
            ThreePointArc((14.354483046, 18.631404879), (15.794357566, 16.848631231), (17.114481483, 14.975453887))
            Line((17.114481483, 14.975453887), (3.356052101, -11.978528384))
            ThreePointArc((3.356052101, -11.978528384), (-1.1894065, -17.65957368), (-7.666994922, -20.972626318))
            Line((-7.666994922, -20.972626318), (10.827935256, -30.649745668))
            ThreePointArc((10.827935256, -30.649745668), (8.892287068, -32.215693657), (6.850211416, -33.640072135))
            Line((6.850211416, -33.640072135), (-19.51460942, -19.911300895))
            ThreePointArc((-19.51460942, -19.911300895), (-25.3301569, -15.464601573), (-28.78923236, -9.0125845))
            Line((-28.78923236, -9.0125845), (-38.483138566, -27.283008992))
            ThreePointArc((-38.483138566, -27.283008992), (-40.075571458, -25.324239358), (-41.522676276, -23.255783742))
            Line((-41.522676276, -23.255783742), (-28.271072163, 2.066799257))
            ThreePointArc((-28.271072163, 2.066799257), (-23.611159336, 8.737400667), (-16.419363442, 12.543945367))
            Line((-16.419363442, 12.543945367), (-35.060584427, 22.210826022))
            ThreePointArc((-35.060584427, 22.210826022), (-33.197836064, 23.716590467), (-31.236462552, 25.091425719))
        make_face()
    extrude(amount=EXTRUDE_6_DEPTH)


with BuildPart() as body_2:
    # Эскиз7 → Бобышка-Вытянуть4 (new, two sides: drawn at the far end of the back side and taken through both)
    with BuildSketch(Plane(origin=(0, 12.5, 0), x_dir=(1, 0, 0), z_dir=(0, 1, 0)).offset(-EXTRUDE_4_DEPTH_BACK)):
        with BuildLine():
            Line((-12.139359553, 35.203260234), (-12.139359553, 20.73945659))
            ThreePointArc((-12.139359553, 20.73945659), (-15.303501581, 20.433227158), (-18.350194711, 19.525905708))
            Line((-18.350194711, 19.525905708), (-23.794576541, 32.925917735))
            ThreePointArc((-23.794576541, 32.925917735), (-37.826389221, 21.529154185), (-43.103163196, 4.23945659))
            Line((-43.103163196, 4.23945659), (-28.639359553, 4.23945659))
            ThreePointArc((-28.639359553, 4.23945659), (-28.198812588, 0.452113431), (-26.90069674, -3.132986996))
            Line((-26.90069674, -3.132986996), (-39.840398716, -9.595627991))
            ThreePointArc((-39.840398716, -9.595627991), (-28.423865896, -22.096298368), (-12.139359553, -26.724347054))
            Line((-12.139359553, -26.724347054), (-12.139359553, -12.26054341))
            ThreePointArc((-12.139359553, -12.26054341), (-8.975217524, -11.954313978), (-5.928524394, -11.046992528))
            Line((-5.928524394, -11.046992528), (-0.484142564, -24.447004555))
            ThreePointArc((-0.484142564, -24.447004555), (13.547670115, -13.050241005), (18.824444091, 4.23945659))
            Line((18.824444091, 4.23945659), (4.360640447, 4.23945659))
            ThreePointArc((4.360640447, 4.23945659), (3.920093483, 8.026799749), (2.621977635, 11.611900176))
            Line((2.621977635, 11.611900176), (15.561679611, 18.074541171))
            ThreePointArc((15.561679611, 18.074541171), (4.145146791, 30.575211548), (-12.139359553, 35.203260234))
        make_face()
    extrude(amount=EXTRUDE_4_DEPTH + EXTRUDE_4_DEPTH_BACK)


solid = Compound([part.part, body_2.part])
